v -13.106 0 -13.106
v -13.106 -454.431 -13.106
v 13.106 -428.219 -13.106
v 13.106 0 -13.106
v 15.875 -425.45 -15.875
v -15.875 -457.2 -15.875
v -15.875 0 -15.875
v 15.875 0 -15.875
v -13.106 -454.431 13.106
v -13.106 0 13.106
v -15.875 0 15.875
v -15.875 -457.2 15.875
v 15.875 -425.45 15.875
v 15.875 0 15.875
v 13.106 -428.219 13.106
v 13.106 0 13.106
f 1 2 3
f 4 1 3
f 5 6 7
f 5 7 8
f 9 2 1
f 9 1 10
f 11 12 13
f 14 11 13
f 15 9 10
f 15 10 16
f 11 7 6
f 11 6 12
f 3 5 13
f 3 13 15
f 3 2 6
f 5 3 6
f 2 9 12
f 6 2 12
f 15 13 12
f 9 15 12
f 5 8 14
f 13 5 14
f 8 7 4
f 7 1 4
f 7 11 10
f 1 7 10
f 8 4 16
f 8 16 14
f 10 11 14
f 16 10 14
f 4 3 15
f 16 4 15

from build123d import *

# Parameters (mm, degrees)
SKETCH_W     = 31.75
SKETCH_H     = 31.75
SKETCH_W_2   = 26.2128
SKETCH_H_2   = 26.2128
PAD_DEPTH    = 457.2
POCKET_DEPTH = 31.75


with BuildPart() as part:
    # Sketch → Pad (new body)
    with BuildSketch(Plane.XZ):
        Rectangle(SKETCH_W, SKETCH_H)
        Rectangle(SKETCH_W_2, SKETCH_H_2, mode=Mode.SUBTRACT)
    extrude(amount=PAD_DEPTH)

    # Sketch001 → Pocket (cut)
    with BuildSketch(Plane(origin=(0, 0, 15.875), x_dir=(-1, 0, 0), z_dir=(0, 0, 1))):
        Polygon((15.875, 457.2), (-15.875, 457.2), (-15.875, 425.45), align=None)
    extrude(amount=-POCKET_DEPTH, mode=Mode.SUBTRACT)


solid = part.part
